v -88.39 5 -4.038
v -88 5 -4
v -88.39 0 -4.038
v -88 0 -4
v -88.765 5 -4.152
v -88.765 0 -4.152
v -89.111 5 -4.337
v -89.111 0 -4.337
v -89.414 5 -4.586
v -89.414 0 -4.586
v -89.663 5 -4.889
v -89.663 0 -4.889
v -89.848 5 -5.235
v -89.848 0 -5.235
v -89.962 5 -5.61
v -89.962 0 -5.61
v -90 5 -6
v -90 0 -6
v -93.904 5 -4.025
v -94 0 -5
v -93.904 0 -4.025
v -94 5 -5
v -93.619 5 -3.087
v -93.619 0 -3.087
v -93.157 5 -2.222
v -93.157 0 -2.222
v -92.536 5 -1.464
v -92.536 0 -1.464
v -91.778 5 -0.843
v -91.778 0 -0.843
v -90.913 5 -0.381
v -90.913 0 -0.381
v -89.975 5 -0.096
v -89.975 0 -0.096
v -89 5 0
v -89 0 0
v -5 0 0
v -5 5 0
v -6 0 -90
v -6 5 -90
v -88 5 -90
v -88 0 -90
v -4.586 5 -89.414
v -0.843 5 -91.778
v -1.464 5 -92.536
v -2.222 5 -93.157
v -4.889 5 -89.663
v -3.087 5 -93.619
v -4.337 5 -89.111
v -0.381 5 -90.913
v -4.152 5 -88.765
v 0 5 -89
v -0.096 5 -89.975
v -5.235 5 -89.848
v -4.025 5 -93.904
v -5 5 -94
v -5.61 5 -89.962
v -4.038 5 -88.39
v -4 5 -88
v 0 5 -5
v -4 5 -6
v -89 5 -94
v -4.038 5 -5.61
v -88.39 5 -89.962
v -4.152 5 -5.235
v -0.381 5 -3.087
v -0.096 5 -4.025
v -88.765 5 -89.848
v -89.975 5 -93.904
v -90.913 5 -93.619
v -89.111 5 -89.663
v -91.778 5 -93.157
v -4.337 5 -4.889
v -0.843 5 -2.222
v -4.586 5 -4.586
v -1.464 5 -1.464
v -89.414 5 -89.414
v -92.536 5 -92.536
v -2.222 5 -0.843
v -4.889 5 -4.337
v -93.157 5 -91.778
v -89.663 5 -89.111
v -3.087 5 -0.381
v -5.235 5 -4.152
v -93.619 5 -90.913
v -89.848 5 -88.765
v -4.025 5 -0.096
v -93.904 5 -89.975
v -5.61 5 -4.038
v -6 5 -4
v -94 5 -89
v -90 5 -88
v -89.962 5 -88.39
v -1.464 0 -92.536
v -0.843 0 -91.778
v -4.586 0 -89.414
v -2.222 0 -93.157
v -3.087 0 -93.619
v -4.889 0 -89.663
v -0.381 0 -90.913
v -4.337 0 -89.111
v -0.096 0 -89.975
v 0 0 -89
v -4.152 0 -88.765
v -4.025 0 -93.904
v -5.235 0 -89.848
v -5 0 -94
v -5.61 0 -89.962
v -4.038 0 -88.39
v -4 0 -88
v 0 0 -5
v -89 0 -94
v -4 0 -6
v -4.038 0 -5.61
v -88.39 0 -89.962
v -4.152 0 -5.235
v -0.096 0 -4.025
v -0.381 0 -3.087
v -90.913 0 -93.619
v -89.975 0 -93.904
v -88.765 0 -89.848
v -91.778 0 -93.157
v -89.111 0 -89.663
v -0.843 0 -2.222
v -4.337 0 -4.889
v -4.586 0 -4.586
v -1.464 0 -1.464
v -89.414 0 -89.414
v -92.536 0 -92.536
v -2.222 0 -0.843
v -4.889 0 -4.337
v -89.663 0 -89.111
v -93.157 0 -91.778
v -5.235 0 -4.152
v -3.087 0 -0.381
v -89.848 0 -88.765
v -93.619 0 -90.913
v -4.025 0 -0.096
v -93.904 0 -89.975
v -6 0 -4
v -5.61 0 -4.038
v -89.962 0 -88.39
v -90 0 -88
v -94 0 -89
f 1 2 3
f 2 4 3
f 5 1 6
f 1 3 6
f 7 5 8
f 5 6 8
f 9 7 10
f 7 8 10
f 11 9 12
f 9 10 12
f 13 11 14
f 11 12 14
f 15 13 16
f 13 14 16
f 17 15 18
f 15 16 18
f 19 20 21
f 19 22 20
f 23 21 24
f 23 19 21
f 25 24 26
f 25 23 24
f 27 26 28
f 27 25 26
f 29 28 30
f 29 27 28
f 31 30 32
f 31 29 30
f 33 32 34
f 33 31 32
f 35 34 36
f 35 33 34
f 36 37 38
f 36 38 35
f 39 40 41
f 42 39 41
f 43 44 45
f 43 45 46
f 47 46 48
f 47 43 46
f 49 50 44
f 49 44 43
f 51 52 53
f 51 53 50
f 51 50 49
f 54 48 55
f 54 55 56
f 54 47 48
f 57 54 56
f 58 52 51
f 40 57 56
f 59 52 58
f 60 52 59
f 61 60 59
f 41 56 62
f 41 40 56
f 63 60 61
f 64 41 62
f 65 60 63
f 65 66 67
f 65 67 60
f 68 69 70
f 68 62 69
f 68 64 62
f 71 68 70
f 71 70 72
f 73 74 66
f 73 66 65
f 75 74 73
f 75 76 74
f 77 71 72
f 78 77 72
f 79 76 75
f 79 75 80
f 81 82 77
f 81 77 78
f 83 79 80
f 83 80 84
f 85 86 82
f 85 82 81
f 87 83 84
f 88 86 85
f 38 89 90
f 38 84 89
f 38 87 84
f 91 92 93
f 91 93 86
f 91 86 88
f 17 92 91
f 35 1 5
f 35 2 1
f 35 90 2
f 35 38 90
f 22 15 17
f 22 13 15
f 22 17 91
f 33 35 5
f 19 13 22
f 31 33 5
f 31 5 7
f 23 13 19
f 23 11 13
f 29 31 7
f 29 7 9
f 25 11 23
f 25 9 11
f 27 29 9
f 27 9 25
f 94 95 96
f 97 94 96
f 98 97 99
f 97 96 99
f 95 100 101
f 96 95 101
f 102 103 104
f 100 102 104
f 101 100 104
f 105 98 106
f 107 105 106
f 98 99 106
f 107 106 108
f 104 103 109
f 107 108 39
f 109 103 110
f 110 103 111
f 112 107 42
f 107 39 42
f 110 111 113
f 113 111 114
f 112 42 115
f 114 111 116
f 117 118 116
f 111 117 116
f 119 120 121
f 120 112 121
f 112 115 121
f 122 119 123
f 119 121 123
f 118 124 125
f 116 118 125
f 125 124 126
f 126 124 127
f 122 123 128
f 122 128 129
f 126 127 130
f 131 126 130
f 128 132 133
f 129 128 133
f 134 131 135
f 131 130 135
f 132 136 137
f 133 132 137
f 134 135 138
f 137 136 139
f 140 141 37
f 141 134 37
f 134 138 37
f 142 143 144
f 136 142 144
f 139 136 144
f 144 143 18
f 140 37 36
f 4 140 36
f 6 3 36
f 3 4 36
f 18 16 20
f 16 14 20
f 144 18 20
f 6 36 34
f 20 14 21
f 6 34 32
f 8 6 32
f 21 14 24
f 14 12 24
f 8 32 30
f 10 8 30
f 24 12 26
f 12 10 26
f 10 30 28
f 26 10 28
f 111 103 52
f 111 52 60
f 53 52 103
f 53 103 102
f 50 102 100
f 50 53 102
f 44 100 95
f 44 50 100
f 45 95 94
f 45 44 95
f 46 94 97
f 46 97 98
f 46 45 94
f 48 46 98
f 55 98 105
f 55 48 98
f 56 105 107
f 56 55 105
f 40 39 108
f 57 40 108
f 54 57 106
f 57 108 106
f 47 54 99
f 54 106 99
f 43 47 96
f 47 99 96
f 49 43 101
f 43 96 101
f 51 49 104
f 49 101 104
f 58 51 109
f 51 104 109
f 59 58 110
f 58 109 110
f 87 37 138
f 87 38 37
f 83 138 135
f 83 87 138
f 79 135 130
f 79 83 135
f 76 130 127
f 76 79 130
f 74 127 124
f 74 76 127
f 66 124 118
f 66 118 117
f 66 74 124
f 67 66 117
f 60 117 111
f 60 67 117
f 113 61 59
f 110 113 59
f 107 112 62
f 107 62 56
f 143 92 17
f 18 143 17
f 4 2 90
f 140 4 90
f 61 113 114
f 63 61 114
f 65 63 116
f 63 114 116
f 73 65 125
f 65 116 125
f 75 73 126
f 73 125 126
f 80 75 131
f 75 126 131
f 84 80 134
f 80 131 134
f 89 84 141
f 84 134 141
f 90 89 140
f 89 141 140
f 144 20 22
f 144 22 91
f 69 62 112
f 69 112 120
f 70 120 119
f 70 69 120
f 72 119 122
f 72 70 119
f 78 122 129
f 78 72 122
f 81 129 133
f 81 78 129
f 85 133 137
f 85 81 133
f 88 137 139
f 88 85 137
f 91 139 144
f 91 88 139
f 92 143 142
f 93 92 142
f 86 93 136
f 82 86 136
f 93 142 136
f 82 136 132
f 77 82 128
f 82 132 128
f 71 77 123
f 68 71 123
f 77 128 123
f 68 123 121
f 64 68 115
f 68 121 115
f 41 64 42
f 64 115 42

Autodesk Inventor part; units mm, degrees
ref_plane "YZ Plane" through (0, 0, 0) normal (1, 0, 0) x (0, 1, 0)
ref_plane "XZ Plane" through (0, 0, 0) normal (0, 1, 0) x (-1, 0, 0)
ref_plane "XY Plane" through (0, 0, 0) normal (0, 0, 1) x (1, 0, 0)
sketch "Sketch1" plane through (0, 0, 0) normal (0, 1, 0) x (-1, 0, 0)
  line L0 (0, 0) -> (94, 0)
  line L1 (94, 0) -> (94, -94)
  line L2 (94, -94) -> (0, -94)
  line L3 (0, -94) -> (0, 0)
  dimension "d0" = 94
  dimension "d1" = 94
extrude "Extrusion1" add sketch "Sketch1" along normal blind 5
sketch "Sketch2" plane through (0, 5, 0) normal (0, 1, 0) x (1, 0, 0)
  line L0 (-90, 4) -> (-4, 4)
  line L1 (-4, 4) -> (-4, 90)
  line L2 (-4, 90) -> (-90, 90)
  line L3 (-90, 90) -> (-90, 4)
  line L4 (0, 94) -> (-94, 94) projected
  line L5 (-94, 94) -> (-94, 0) projected
  line L6 (-94, 0) -> (0, 0) projected
  line L7 (0, 0) -> (0, 94) projected
  dimension "d4" = 4
  dimension "d5" = 4
  dimension "d6" = 4
  dimension "d7" = 4
extrude "Extrusion2" cut sketch "Sketch2" against normal blind 5 contours L3 L2 L1 L0
fillet "Fillet1" radius 5 4 edges at (-94, 2.5, -94) (0, 2.5, 0) (0, 2.5, -94) (-94, 2.5, 0)
sketch "Sketch3" plane through (0, 5, 0) normal (0, 1, 0) x (1, 0, 0)
  line L0 (-91.5, 91.5) -> (-2.5, 91.5) construction
  line L1 (-2.5, 91.5) -> (-2.5, 2.5) construction
  line L2 (-2.5, 2.5) -> (-91.5, 2.5) construction
  line L3 (-91.5, 2.5) -> (-91.5, 91.5) construction
  line L4 (0, 5) -> (0, 89) projected
  line L5 (-5, 94) -> (-89, 94) projected
  line L6 (-94, 89) -> (-94, 5) projected
  line L7 (-89, 0) -> (-5, 0) projected
  point P0 (0, 0)
  dimension "d11" = 2.5
  dimension "d12" = 2.5
  dimension "d13" = 2.5
  dimension "d14" = 2.5
fillet "Fillet2" radius 2 4 edges at (-90, 2.5, -90) (-4, 2.5, -90) (-4, 2.5, -4) (-90, 2.5, -4)
properties part number "Adult fly trap middle"
